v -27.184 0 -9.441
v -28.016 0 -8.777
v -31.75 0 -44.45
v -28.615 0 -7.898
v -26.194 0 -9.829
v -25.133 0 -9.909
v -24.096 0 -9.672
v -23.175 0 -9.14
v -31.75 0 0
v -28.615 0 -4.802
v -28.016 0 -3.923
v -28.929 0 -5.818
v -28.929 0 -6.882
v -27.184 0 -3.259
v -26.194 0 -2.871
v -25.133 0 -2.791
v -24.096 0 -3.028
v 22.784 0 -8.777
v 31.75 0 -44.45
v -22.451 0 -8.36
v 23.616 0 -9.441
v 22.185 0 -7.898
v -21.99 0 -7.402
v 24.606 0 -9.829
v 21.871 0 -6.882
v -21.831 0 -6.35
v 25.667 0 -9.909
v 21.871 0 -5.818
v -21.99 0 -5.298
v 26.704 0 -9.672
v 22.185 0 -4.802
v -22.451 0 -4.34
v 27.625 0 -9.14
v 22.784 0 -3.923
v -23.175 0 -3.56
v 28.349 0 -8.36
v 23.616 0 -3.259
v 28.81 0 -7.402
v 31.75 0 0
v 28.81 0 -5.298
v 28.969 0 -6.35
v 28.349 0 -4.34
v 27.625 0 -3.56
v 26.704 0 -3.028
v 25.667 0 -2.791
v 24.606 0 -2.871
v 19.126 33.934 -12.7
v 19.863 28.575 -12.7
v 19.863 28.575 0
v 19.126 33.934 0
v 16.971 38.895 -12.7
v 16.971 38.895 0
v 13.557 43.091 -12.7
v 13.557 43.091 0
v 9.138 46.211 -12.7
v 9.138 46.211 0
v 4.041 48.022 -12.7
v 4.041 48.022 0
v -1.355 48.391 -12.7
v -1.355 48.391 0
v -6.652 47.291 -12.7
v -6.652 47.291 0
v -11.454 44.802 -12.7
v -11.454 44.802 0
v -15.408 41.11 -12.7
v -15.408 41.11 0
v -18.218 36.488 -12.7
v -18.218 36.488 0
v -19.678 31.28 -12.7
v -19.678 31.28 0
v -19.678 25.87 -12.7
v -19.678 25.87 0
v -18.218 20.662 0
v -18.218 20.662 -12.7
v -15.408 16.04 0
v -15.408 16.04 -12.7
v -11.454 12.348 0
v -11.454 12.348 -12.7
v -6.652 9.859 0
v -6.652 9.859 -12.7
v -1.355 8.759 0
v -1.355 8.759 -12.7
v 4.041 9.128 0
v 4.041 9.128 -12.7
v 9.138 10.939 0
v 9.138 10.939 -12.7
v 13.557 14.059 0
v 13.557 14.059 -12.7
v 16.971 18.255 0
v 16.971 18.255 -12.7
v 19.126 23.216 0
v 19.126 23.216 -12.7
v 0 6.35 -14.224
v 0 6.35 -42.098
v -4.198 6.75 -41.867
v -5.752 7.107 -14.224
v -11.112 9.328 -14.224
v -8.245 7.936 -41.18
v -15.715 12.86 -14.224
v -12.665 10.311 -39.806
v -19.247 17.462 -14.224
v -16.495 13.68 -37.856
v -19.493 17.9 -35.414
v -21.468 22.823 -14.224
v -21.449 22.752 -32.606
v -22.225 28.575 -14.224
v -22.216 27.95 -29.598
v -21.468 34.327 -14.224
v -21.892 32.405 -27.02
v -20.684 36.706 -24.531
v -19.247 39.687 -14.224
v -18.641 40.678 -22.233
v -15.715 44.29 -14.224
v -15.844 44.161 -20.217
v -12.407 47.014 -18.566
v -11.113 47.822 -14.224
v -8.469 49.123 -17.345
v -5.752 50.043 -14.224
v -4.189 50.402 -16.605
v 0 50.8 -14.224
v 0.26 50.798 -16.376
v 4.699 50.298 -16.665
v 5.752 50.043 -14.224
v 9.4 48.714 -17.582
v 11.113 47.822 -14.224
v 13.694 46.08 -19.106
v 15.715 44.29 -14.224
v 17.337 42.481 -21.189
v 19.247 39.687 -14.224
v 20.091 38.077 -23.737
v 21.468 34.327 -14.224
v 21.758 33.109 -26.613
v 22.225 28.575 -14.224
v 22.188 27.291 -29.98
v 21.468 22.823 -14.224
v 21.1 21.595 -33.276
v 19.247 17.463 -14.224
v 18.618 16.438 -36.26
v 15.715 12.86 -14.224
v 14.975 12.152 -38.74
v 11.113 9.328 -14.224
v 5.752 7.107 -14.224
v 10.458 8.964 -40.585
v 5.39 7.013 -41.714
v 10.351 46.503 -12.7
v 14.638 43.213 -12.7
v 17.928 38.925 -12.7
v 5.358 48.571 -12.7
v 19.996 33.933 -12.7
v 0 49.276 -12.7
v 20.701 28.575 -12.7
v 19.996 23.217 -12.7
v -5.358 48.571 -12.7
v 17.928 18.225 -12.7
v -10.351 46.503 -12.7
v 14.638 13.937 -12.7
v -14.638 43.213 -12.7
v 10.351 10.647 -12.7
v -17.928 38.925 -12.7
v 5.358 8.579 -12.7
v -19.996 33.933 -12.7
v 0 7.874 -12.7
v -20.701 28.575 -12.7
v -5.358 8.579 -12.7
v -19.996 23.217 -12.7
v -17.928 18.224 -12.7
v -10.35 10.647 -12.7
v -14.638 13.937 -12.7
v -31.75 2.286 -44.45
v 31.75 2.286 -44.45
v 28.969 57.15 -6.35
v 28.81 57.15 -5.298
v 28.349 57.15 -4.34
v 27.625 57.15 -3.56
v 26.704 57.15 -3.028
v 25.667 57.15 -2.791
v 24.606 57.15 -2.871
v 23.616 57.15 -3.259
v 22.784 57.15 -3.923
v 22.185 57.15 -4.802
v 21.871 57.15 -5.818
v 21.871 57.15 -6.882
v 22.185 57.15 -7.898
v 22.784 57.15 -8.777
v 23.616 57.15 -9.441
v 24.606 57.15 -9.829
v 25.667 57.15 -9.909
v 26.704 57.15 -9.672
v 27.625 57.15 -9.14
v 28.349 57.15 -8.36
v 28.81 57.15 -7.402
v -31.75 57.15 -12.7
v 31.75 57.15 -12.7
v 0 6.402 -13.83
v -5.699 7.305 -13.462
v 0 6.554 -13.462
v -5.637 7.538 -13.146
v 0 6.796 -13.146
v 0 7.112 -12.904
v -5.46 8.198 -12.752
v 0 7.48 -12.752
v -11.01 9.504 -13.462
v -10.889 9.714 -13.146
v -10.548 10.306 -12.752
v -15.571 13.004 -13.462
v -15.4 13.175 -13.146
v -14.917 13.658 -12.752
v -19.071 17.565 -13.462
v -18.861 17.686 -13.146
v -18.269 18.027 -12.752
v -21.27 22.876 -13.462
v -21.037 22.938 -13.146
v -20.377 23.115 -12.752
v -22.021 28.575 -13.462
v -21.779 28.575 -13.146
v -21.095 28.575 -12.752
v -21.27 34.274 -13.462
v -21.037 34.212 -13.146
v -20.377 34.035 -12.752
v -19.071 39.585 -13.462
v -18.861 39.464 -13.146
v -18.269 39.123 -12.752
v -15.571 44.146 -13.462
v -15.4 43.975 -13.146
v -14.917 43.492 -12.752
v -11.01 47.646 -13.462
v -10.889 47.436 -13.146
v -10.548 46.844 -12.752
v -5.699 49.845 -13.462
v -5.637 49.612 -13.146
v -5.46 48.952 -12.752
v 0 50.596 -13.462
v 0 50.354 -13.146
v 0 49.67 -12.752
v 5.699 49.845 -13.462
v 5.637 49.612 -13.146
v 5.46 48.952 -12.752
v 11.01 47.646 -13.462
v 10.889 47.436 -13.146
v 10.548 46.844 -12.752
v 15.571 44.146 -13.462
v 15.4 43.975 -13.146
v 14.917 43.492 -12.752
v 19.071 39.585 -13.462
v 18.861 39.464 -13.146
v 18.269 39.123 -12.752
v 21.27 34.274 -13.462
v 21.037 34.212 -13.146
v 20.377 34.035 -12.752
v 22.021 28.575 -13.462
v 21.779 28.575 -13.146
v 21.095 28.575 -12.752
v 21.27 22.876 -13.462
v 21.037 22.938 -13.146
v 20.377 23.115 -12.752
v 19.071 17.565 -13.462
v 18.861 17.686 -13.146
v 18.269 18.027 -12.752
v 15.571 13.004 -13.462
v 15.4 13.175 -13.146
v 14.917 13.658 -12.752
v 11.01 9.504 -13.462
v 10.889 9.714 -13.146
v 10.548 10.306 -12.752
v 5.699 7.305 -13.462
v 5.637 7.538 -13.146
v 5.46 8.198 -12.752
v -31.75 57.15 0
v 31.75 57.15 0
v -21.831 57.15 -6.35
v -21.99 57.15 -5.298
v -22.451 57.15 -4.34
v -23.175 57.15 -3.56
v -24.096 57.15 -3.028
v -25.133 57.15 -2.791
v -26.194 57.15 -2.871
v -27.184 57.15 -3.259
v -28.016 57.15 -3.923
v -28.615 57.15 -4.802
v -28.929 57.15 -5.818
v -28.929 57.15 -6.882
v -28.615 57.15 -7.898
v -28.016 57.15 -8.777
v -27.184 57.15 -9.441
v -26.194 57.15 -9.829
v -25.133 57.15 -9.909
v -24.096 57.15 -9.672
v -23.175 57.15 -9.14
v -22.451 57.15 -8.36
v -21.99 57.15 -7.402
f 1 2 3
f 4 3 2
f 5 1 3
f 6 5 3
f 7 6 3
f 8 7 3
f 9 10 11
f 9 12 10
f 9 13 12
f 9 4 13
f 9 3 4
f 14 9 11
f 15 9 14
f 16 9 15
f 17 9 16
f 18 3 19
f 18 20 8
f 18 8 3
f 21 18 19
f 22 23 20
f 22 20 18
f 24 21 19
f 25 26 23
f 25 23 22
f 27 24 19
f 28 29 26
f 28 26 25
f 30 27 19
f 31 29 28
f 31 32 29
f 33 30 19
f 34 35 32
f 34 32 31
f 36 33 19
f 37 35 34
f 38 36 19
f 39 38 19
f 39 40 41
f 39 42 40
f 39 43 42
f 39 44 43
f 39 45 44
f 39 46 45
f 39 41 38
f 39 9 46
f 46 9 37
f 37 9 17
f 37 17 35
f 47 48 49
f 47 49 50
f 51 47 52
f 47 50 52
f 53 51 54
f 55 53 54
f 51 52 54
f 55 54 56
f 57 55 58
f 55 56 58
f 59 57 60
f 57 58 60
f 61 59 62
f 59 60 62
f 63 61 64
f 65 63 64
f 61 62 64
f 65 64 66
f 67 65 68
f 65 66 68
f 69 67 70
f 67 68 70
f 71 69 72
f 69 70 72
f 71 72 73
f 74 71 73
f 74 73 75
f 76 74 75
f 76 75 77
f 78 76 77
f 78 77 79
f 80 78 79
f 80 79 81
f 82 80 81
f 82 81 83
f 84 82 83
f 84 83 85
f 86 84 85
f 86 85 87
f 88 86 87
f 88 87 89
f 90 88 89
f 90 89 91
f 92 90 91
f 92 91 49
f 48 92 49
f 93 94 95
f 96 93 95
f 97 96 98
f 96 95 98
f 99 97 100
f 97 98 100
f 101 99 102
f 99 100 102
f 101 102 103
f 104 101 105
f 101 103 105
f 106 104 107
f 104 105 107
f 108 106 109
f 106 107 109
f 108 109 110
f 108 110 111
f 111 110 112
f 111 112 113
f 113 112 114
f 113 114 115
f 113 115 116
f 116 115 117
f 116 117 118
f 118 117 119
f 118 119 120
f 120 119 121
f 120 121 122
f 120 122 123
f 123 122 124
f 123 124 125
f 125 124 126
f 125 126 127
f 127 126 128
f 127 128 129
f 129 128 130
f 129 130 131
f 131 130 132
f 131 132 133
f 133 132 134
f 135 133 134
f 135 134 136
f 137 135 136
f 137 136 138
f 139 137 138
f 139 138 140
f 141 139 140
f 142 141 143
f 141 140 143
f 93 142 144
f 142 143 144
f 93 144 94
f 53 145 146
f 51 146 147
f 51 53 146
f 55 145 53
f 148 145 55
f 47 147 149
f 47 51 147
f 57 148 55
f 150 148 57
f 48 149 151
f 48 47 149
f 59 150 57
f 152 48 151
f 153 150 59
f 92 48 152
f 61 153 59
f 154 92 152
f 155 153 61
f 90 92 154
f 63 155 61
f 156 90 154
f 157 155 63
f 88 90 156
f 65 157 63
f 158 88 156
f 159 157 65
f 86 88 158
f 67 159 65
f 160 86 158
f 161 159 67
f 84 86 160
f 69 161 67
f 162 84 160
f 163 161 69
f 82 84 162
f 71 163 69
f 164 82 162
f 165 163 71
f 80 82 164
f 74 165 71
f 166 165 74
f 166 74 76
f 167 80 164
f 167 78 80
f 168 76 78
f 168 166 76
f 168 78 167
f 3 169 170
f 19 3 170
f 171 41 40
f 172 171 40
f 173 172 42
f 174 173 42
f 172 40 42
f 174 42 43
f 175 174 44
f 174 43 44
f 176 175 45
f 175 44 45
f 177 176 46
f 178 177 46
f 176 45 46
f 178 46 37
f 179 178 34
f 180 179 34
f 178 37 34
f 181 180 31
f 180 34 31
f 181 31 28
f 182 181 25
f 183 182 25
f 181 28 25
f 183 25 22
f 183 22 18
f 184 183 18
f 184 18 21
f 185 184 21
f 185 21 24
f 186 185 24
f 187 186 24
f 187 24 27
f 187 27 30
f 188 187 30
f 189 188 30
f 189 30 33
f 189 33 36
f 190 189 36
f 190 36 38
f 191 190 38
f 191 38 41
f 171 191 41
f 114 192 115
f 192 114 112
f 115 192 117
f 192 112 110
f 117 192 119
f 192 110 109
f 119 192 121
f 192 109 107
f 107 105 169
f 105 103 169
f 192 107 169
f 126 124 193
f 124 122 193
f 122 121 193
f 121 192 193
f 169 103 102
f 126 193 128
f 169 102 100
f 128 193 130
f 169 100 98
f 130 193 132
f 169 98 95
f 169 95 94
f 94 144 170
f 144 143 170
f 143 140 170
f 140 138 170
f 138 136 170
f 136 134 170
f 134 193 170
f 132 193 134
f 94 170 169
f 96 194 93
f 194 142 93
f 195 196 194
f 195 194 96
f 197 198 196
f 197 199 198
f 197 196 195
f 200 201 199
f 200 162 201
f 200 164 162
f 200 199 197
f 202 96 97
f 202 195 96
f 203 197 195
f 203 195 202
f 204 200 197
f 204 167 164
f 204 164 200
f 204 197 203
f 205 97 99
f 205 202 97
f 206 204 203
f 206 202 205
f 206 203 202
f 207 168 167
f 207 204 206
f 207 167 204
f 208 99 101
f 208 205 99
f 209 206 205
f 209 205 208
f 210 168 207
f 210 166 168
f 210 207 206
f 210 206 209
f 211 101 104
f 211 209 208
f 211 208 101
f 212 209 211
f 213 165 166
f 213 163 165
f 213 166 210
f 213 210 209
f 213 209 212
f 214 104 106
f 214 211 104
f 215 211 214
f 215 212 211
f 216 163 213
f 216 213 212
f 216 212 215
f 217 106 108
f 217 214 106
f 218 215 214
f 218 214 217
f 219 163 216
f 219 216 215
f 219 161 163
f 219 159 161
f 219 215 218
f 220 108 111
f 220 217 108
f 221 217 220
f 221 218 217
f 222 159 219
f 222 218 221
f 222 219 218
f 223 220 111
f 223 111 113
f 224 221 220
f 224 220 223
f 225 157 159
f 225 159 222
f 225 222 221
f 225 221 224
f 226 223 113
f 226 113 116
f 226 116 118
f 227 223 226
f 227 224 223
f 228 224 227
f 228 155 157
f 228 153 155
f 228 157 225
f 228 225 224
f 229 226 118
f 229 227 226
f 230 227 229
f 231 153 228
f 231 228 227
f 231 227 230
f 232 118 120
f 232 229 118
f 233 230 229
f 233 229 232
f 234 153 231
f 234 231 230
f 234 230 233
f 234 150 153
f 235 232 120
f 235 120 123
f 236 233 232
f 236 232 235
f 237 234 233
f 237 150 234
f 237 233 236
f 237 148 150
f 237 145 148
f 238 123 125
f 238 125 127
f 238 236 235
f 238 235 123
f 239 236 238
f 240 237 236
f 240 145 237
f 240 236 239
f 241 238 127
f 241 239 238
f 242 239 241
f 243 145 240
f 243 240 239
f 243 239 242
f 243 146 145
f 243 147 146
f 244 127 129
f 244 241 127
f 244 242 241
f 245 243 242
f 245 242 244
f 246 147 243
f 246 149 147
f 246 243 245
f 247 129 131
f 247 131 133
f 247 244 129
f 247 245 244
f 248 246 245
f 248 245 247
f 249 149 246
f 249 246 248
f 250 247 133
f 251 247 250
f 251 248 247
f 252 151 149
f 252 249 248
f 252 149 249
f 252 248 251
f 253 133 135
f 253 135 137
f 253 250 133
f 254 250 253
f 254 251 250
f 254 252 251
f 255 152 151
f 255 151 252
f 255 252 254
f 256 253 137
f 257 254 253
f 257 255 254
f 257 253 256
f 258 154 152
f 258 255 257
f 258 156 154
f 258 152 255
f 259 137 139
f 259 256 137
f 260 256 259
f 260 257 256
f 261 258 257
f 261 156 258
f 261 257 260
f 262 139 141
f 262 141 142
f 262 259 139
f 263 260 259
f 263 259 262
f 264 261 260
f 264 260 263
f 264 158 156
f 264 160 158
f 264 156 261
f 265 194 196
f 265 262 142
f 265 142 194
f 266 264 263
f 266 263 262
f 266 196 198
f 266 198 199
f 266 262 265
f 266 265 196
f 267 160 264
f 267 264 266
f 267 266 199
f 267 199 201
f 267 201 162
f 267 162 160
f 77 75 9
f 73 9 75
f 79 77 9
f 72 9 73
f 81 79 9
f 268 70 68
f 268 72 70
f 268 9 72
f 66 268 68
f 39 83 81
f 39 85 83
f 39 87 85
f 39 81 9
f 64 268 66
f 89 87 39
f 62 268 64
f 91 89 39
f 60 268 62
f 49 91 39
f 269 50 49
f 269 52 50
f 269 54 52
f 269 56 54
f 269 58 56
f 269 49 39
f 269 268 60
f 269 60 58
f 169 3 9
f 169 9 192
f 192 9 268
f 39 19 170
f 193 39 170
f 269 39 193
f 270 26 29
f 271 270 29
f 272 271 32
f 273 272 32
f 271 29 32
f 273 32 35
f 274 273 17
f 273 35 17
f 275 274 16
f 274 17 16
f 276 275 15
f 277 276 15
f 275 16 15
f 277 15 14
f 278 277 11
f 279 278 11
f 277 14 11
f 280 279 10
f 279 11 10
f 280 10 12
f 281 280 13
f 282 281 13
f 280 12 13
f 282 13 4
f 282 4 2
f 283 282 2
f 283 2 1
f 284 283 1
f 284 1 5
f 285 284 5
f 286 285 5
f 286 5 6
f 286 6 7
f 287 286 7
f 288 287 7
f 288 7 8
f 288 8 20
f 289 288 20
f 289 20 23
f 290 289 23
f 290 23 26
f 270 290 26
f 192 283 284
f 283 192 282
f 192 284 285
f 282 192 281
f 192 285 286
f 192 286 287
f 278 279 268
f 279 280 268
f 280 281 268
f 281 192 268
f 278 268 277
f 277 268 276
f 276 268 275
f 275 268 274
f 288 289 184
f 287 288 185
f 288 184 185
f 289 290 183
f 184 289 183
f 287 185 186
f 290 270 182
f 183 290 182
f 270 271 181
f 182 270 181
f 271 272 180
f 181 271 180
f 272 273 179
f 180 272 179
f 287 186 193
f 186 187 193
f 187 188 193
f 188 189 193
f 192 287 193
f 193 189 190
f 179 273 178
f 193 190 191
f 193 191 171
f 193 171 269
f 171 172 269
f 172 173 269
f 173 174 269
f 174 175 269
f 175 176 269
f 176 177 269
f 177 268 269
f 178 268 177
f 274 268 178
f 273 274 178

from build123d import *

# Parameters (mm, degrees)
SKETCH1_W          = 63.5
SKETCH1_H          = 57.15
SKETCH1_R          = 19.8628
EXTRUDE1_DEPTH     = 44.45
CUT_EXTRUDE1_DEPTH = 64.5
SKETCH3_R          = 22.225
CUT_EXTRUDE2_DEPTH = 31.75
FILLET1_R          = 1.524
HOLE1_D            = 7.1374
HOLE1_DEPTH        = 57.15


with BuildPart() as part:
    # Sketch1 → Extrude1 (new body)
    with BuildSketch(Plane.XY):
        with Locations((0, 28.575)):
            Rectangle(SKETCH1_W, SKETCH1_H)
        with Locations((0, 28.575)):
            Circle(SKETCH1_R, mode=Mode.SUBTRACT)
    extrude(amount=-EXTRUDE1_DEPTH)

    # Sketch2 → Cut-Extrude1 (cut, through all)
    with BuildSketch(Plane(origin=(31.75, 0, 0), x_dir=(0, 0, -1), z_dir=(1, 0, 0))):
        Polygon((12.7, 57.15), (44.45, 2.286), (44.45, 57.15), align=None)
    extrude(amount=-CUT_EXTRUDE1_DEPTH, mode=Mode.SUBTRACT)

    # Sketch3 → Cut-Extrude2 (cut)
    with BuildSketch(Plane(origin=(0, 0, -44.45), x_dir=(-1, 0, 0), z_dir=(0, 0, -1))):
        with Locations(Location((0, 28.575, 0), (0, 0, 270))):  # turned: the seam where the file's is
            Circle(SKETCH3_R)
    extrude(amount=-CUT_EXTRUDE2_DEPTH, mode=Mode.SUBTRACT)

    # Fillet1
    fillet1_edges = [part.edges().sort_by_distance(p)[0] for p in [
        (0, 50.8, -12.7),
    ]]
    fillet(fillet1_edges, radius=FILLET1_R)

    # Hole1
    with Locations(Plane(origin=(0, 57.15, 0), x_dir=(-1, 0, 0), z_dir=(0, 1, 0))):
        with Locations((25.4, -6.35), (-25.4, -6.35)):
            Hole(HOLE1_D / 2, depth=HOLE1_DEPTH)


solid = part.part
